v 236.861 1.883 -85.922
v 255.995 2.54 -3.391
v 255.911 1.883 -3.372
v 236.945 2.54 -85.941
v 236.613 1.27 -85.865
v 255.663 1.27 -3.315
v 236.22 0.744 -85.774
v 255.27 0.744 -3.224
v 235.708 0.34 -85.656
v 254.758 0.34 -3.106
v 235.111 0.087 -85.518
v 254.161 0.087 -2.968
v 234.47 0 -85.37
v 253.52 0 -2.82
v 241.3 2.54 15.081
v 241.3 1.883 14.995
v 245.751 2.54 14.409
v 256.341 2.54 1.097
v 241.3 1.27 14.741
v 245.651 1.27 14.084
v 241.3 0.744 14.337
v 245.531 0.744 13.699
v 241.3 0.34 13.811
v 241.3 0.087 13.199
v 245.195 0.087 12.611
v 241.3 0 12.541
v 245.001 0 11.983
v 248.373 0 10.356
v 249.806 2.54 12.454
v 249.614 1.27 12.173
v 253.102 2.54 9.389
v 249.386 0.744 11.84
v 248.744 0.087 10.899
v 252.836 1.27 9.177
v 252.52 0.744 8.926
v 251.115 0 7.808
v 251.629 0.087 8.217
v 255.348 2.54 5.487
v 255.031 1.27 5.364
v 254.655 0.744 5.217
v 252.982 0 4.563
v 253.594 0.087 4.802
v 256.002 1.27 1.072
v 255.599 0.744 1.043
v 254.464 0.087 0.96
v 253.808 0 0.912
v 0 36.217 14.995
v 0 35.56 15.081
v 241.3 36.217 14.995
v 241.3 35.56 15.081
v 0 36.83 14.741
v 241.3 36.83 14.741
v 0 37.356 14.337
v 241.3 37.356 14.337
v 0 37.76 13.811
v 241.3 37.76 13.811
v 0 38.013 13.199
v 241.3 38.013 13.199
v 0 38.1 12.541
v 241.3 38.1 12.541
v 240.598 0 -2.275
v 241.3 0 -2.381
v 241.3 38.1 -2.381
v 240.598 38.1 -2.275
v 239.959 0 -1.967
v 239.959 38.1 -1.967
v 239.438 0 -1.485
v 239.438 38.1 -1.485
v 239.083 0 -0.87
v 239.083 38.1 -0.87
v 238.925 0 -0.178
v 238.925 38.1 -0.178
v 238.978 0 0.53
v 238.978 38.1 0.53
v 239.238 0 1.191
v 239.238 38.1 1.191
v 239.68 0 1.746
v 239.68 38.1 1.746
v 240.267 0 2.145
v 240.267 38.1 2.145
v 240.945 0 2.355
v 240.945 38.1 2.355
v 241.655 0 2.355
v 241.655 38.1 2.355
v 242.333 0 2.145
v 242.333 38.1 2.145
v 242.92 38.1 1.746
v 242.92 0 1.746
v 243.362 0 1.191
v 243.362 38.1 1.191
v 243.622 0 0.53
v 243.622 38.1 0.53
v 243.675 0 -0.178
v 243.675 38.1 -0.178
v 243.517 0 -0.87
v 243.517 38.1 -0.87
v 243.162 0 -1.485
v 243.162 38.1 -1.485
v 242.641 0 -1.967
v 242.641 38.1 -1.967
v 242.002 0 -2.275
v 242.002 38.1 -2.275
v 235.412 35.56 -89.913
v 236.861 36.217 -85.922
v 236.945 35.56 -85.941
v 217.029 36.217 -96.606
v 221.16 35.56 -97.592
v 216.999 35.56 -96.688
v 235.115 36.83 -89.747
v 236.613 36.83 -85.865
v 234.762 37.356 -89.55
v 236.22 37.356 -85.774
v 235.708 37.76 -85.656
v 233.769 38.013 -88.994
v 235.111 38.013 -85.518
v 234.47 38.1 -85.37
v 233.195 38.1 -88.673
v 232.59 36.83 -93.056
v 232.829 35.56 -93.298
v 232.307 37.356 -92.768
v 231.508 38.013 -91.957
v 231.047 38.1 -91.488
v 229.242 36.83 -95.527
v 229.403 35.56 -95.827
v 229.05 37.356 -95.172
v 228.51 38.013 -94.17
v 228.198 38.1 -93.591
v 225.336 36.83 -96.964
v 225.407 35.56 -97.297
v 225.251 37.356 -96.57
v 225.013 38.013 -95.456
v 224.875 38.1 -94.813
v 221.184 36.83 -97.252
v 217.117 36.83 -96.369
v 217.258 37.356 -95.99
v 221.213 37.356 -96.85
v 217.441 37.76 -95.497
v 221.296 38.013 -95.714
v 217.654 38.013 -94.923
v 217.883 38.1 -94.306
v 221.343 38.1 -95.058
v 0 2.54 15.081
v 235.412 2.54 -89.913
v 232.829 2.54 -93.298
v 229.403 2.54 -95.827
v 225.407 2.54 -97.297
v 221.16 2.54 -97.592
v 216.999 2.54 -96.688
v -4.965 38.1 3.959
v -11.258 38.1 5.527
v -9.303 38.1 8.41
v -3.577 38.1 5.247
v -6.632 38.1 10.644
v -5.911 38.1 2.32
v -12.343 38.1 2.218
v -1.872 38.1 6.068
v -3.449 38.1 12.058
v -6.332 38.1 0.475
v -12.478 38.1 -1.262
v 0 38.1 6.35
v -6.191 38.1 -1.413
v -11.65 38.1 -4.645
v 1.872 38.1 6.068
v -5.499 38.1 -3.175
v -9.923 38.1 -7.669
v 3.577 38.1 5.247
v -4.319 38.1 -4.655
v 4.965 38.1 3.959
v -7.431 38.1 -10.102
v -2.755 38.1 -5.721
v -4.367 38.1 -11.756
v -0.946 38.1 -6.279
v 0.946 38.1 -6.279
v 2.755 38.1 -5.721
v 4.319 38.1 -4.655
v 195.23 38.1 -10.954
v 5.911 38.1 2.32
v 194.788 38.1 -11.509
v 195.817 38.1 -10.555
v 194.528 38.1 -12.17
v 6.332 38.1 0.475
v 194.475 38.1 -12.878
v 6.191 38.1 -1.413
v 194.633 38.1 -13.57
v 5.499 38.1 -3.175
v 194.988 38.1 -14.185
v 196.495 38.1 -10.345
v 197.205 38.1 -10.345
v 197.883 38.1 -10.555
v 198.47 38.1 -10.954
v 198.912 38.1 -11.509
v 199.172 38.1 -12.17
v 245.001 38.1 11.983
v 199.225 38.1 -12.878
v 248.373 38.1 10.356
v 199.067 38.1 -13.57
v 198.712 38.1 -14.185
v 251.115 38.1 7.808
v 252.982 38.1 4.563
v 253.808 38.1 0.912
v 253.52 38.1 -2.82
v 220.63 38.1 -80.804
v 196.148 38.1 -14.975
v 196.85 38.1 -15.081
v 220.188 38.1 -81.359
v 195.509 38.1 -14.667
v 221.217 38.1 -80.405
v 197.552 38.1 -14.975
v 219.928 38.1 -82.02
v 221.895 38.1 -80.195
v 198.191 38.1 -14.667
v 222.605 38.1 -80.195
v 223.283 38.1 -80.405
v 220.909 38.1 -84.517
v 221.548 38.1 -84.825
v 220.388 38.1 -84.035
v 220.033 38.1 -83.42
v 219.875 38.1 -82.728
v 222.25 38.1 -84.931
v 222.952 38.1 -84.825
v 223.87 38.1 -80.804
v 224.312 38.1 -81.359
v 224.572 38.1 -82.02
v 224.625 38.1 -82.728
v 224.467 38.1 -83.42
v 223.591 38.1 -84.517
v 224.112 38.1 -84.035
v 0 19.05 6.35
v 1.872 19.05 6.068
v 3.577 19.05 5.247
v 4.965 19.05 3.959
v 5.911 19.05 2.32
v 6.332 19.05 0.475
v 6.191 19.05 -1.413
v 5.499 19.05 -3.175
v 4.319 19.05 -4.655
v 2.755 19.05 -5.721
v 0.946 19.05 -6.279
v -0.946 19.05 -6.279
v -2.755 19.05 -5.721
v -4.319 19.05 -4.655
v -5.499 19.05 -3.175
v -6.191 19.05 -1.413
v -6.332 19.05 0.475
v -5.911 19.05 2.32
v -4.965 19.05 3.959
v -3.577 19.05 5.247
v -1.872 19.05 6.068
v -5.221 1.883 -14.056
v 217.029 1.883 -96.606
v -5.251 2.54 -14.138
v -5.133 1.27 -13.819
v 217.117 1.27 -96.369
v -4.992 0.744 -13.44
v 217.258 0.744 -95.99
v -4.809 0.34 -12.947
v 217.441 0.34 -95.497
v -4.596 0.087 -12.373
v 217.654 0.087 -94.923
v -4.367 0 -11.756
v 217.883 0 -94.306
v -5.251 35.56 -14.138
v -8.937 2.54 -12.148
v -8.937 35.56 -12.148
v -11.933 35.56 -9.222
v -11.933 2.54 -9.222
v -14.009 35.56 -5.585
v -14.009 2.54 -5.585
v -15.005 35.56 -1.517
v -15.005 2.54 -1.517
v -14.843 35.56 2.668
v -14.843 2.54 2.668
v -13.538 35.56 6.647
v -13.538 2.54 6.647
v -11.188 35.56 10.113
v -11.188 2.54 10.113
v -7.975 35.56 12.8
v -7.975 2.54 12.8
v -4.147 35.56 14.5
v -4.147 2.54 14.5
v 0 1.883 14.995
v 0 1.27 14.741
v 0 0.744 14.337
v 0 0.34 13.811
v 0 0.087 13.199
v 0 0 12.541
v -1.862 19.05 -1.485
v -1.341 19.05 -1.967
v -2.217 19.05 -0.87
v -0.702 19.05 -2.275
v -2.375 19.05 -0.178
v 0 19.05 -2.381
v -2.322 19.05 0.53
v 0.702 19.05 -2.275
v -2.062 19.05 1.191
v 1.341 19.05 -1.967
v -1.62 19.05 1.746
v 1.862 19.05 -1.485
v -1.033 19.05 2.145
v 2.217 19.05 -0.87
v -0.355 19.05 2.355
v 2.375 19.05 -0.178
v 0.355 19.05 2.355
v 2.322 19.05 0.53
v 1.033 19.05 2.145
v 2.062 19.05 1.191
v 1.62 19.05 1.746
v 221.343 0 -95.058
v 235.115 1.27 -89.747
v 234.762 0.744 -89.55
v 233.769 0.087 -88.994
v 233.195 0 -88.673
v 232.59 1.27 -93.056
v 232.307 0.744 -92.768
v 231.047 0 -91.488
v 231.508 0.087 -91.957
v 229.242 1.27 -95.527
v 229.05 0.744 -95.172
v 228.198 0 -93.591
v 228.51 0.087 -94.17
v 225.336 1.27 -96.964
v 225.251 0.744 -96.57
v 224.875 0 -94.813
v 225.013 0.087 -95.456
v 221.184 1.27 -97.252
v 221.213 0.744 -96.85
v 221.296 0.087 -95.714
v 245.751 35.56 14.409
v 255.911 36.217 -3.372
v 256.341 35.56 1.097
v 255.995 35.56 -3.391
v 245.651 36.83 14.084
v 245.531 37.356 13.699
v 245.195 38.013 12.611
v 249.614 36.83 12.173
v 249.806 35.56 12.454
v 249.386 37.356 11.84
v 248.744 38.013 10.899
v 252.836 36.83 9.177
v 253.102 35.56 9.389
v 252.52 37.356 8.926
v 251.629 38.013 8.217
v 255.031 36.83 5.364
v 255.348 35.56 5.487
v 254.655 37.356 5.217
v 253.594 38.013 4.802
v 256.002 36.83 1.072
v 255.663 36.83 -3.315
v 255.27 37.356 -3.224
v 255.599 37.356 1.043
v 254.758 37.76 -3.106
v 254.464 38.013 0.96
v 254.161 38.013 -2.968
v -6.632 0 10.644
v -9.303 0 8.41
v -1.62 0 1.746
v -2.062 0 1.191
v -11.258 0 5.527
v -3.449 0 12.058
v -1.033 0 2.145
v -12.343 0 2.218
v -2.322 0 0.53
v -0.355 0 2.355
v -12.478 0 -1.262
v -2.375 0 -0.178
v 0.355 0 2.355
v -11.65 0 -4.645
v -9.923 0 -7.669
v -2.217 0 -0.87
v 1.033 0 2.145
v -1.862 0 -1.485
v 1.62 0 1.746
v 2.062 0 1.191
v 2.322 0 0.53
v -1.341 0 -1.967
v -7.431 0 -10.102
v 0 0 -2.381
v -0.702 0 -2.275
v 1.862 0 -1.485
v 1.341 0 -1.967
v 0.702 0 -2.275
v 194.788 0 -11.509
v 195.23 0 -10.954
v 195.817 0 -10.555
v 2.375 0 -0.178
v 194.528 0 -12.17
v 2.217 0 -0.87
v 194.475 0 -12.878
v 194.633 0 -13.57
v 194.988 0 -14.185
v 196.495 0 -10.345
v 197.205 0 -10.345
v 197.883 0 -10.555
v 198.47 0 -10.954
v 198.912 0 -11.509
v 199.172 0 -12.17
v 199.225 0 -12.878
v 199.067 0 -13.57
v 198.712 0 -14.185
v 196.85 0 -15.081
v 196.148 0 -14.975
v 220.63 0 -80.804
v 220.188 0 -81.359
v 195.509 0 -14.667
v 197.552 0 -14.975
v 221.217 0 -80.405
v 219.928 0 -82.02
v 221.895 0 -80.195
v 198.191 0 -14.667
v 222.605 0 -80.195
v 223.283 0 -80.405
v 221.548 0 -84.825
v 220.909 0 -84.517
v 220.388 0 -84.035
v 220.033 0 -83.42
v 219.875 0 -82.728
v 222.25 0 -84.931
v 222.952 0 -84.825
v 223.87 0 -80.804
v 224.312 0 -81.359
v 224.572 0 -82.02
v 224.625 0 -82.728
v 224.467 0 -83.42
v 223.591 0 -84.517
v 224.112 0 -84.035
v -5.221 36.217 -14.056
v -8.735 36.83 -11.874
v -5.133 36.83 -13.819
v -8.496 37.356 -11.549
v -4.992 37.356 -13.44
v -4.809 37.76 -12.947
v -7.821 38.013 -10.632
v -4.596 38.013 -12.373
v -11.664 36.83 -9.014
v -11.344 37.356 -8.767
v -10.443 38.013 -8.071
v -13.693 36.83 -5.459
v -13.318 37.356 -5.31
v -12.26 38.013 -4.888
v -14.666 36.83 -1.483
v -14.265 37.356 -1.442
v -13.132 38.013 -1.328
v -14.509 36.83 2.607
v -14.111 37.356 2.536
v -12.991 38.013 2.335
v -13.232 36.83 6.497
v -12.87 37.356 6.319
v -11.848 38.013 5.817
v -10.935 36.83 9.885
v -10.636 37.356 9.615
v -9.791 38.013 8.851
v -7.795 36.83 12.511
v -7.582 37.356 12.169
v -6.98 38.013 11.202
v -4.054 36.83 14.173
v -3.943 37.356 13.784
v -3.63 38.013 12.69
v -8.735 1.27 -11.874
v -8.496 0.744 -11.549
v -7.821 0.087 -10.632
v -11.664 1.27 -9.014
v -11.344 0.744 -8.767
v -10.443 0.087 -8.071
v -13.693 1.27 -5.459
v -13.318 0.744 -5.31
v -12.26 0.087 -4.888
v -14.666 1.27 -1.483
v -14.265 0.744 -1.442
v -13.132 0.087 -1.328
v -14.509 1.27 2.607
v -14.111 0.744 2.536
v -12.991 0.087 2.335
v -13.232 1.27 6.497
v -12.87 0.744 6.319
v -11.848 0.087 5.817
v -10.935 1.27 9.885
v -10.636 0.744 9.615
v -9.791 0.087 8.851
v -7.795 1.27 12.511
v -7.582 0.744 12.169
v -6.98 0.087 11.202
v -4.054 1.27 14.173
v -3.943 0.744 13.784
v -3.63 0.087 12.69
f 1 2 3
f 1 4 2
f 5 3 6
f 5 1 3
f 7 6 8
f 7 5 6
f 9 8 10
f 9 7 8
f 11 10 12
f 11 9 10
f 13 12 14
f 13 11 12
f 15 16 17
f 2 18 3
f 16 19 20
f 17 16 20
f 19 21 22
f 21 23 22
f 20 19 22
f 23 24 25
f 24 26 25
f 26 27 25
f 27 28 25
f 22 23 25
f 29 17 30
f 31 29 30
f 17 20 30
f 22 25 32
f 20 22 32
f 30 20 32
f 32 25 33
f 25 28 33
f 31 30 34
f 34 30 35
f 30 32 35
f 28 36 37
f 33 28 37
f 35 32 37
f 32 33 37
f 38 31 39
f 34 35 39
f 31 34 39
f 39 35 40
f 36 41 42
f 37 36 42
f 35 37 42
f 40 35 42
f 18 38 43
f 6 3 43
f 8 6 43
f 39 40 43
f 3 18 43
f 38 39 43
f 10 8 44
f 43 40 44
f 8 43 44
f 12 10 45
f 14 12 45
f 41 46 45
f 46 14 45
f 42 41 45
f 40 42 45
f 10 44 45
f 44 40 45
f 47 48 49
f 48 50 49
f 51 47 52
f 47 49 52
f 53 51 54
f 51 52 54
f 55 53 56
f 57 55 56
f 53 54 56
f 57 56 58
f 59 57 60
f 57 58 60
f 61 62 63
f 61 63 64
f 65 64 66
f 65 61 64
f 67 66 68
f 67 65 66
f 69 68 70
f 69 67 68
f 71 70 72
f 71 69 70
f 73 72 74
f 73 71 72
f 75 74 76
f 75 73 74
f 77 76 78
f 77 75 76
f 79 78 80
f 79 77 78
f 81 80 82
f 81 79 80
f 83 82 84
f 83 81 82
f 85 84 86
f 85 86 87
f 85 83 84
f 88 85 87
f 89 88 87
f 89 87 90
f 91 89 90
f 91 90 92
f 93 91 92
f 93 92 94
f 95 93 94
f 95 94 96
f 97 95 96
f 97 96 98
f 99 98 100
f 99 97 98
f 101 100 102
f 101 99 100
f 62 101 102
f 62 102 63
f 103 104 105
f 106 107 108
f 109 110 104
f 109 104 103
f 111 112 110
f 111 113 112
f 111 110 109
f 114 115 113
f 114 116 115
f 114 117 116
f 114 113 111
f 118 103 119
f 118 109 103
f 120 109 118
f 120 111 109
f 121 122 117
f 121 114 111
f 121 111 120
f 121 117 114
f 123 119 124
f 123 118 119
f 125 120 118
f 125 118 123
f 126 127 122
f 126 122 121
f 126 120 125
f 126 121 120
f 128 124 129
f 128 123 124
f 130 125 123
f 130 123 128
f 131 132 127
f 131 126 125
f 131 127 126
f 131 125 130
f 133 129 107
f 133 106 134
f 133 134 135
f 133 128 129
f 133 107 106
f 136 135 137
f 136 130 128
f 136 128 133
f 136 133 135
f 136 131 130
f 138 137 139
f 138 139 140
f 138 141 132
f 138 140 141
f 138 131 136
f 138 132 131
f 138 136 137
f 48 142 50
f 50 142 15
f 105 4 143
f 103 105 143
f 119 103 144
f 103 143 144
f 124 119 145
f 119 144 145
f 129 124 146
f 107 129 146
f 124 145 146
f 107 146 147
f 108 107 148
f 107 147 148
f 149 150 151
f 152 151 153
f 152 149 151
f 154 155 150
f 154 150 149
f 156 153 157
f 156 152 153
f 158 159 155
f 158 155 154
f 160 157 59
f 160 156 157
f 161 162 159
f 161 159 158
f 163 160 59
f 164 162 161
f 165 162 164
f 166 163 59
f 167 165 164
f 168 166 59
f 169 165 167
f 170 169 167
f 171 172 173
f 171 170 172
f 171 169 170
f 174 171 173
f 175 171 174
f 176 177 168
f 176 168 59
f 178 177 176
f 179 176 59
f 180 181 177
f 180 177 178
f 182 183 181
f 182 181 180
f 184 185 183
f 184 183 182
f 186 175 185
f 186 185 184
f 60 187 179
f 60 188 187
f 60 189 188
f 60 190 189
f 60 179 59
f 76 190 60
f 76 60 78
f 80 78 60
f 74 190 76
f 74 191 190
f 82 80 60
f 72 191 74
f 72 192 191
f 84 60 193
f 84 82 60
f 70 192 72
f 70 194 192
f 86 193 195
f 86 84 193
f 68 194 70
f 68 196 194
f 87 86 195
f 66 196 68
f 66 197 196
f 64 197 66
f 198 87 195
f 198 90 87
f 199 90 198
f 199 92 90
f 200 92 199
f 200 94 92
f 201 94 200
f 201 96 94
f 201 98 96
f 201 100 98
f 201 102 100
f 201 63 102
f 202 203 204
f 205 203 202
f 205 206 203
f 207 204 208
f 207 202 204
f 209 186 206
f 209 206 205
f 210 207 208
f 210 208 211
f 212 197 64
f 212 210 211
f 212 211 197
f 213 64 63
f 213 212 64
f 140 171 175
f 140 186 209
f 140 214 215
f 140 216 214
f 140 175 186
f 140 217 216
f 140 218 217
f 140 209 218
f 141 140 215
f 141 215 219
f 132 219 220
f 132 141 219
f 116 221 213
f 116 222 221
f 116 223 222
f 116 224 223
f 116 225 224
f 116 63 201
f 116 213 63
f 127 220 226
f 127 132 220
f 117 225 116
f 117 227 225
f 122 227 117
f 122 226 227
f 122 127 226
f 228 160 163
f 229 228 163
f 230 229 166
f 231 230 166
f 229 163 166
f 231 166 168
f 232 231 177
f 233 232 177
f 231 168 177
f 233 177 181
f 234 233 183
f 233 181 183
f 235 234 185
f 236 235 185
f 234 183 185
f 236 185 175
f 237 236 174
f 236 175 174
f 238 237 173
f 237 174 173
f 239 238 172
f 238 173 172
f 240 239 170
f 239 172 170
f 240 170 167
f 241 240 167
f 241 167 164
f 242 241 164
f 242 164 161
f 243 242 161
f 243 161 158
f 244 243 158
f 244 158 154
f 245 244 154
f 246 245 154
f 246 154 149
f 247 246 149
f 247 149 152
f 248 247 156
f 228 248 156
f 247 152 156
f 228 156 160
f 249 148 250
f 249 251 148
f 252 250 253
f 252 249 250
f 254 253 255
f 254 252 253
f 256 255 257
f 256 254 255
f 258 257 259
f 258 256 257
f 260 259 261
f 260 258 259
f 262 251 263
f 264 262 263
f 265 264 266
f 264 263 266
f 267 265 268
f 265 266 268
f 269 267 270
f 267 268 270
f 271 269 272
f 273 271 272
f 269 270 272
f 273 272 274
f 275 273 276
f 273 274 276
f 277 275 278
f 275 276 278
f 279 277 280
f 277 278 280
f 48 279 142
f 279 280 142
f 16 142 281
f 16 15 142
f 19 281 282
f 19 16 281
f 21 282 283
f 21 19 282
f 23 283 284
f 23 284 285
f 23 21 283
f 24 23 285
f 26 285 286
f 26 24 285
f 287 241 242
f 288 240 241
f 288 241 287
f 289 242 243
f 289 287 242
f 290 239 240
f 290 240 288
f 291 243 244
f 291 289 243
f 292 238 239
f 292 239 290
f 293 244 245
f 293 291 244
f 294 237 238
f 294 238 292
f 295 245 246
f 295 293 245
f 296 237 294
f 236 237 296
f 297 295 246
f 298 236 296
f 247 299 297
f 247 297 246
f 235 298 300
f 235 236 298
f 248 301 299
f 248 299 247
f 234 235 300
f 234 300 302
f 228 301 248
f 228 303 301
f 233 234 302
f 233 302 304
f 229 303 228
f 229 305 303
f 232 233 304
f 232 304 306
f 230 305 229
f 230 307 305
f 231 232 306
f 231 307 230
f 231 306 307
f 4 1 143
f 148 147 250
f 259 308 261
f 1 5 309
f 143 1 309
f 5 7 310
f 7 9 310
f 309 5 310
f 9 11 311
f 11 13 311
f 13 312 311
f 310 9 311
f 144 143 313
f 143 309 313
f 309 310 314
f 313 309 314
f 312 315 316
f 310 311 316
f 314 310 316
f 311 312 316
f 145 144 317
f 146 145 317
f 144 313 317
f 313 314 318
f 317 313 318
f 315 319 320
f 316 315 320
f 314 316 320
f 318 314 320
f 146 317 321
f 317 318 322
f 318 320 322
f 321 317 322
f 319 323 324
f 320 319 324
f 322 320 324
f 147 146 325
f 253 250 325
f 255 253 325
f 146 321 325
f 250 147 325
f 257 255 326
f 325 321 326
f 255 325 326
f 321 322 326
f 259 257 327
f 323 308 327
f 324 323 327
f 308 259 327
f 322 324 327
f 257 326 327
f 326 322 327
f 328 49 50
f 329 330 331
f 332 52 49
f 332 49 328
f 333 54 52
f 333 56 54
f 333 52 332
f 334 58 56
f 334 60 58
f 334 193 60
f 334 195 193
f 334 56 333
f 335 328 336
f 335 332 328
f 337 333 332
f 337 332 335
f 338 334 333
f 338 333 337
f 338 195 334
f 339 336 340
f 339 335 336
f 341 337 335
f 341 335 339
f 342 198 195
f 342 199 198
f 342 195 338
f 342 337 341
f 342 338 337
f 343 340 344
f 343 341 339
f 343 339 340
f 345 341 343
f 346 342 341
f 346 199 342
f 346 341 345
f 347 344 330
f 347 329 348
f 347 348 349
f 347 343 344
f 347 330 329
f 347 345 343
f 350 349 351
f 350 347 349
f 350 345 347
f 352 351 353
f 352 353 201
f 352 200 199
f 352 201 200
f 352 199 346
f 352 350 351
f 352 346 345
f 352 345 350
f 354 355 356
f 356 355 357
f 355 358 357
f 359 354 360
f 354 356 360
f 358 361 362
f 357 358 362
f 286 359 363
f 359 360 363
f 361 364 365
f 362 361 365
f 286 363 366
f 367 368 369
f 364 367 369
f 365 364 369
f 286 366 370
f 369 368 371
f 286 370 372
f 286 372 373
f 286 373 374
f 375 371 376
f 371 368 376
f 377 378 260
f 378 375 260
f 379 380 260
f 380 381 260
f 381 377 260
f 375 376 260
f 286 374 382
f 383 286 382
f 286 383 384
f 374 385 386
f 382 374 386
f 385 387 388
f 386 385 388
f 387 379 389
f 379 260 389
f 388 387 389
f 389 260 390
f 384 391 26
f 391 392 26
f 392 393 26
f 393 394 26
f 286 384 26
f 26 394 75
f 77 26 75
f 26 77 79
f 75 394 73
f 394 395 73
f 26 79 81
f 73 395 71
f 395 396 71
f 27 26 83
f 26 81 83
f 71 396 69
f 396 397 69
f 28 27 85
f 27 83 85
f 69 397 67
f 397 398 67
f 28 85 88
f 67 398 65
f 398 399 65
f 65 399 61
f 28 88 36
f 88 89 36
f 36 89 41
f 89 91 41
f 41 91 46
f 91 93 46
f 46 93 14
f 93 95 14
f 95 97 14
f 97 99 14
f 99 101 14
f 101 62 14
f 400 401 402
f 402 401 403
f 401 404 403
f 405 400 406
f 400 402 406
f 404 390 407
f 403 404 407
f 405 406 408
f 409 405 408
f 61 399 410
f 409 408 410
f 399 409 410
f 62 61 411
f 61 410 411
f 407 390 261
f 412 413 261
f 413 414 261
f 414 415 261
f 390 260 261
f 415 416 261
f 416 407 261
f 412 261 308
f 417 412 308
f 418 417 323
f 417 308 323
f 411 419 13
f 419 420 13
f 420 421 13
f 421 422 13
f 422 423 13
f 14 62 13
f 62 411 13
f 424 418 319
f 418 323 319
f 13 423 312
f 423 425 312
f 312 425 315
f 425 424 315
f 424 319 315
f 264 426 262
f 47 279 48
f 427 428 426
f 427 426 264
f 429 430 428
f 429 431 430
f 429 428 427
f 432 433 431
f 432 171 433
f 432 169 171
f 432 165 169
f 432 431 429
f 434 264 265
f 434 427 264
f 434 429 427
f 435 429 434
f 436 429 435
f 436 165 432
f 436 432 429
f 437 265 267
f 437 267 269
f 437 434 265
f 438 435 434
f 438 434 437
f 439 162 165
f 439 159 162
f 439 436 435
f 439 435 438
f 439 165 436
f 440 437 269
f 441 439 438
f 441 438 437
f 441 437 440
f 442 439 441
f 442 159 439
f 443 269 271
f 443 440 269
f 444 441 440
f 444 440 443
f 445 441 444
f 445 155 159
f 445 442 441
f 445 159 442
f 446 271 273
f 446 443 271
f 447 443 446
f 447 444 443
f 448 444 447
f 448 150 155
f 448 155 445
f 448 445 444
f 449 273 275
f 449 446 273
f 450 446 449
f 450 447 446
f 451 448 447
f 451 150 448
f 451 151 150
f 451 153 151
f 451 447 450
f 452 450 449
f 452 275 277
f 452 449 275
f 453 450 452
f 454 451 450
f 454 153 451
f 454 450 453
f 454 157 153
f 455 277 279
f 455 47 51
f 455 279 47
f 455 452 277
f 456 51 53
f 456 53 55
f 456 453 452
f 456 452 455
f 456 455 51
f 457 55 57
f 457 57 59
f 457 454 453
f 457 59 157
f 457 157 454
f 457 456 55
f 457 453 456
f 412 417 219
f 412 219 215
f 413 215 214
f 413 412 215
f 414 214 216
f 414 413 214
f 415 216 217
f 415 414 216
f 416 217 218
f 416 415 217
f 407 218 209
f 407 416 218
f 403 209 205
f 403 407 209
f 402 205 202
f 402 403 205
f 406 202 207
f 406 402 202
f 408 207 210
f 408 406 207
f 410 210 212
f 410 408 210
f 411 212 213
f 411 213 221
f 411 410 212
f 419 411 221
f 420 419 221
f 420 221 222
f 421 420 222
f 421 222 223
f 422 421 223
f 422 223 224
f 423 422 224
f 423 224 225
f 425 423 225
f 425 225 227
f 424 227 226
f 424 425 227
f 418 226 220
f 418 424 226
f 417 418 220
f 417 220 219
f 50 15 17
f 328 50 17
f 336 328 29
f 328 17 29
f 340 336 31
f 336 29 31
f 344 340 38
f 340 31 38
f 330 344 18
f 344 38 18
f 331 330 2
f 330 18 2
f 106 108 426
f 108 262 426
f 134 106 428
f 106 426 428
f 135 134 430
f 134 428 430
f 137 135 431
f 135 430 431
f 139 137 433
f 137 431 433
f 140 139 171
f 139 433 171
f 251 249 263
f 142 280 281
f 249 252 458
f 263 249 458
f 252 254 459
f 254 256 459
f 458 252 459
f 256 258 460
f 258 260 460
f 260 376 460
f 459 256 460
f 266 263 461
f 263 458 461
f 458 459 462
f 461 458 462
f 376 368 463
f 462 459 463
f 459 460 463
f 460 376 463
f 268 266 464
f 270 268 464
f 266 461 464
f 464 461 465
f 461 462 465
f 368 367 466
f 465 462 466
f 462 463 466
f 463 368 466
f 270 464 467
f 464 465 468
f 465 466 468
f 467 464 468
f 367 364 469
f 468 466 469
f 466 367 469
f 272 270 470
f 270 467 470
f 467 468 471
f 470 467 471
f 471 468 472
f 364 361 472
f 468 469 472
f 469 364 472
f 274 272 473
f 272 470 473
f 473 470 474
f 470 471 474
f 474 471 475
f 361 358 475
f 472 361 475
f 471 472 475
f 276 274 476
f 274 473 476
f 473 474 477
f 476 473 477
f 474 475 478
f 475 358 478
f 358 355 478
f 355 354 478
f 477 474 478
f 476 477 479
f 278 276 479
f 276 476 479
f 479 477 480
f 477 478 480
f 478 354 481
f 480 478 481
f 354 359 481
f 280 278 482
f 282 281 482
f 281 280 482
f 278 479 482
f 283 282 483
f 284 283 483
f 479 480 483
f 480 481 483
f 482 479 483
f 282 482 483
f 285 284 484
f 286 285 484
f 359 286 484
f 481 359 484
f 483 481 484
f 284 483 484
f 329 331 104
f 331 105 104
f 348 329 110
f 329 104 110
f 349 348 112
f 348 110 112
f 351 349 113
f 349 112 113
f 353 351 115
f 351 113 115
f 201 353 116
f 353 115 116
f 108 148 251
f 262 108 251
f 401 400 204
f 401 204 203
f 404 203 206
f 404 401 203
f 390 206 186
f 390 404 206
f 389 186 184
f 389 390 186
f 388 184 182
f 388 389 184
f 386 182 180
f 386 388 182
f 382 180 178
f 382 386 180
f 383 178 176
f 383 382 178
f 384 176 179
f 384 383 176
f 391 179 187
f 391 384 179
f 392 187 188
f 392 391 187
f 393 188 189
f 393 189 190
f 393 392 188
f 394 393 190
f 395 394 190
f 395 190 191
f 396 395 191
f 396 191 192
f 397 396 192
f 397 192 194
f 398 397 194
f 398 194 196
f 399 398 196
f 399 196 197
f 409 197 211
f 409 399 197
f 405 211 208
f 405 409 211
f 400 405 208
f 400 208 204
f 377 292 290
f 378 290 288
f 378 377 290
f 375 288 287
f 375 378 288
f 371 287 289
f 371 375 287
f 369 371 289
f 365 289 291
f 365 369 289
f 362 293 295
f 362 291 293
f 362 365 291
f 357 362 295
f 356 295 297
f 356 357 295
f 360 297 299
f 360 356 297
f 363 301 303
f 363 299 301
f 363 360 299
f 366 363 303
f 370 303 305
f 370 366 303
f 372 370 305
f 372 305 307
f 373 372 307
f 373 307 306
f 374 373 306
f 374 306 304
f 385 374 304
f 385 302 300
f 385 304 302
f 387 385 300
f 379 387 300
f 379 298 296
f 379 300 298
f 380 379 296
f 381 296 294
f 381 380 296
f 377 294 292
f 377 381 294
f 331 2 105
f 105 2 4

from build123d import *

# Parameters (mm, degrees)
SKETCH1_R           = 2.38125
BOSS_EXTRUDE1_DEPTH = 38.1
FILLET1_R           = 2.54
SKETCH2_R           = 6.35
CUT_EXTRUDE1_DEPTH  = 19.05


with BuildPart() as part:
    # Sketch1 → Boss-Extrude1 (new body)
    with BuildSketch(Plane(origin=(0, 0, 0), x_dir=(1, 0, 0), z_dir=(0, 1, 0))):
        with BuildLine():
            Line((216.9989119, 96.687544883), (-5.2510881, 14.137544883))
            ThreePointArc((-5.2510881, 14.137544883), (-14.843448897, -2.667606866), (0, -15.08125))
            Line((0, -15.08125), (241.3, -15.08125))
            ThreePointArc((241.3, -15.08125), (253.102268215, -9.388853313), (255.99503722, 3.391162435))
            Line((255.99503722, 3.391162435), (236.94503722, 85.941162435))
            ThreePointArc((236.94503722, 85.941162435), (229.403197025, 95.826892478), (216.9989119, 96.687544883))
        make_face()
        with Locations(Location((0, 0, 0), (0, 0, 90))):
            Circle(SKETCH1_R, mode=Mode.SUBTRACT)
        with Locations(Location((196.85, 12.7, 0), (0, 0, 90))):
            Circle(SKETCH1_R, mode=Mode.SUBTRACT)
        with Locations(Location((241.3, 0, 0), (0, 0, 90))):
            Circle(SKETCH1_R, mode=Mode.SUBTRACT)
        with Locations(Location((222.25, 82.55, 0), (0, 0, 90))):
            Circle(SKETCH1_R, mode=Mode.SUBTRACT)
    extrude(amount=BOSS_EXTRUDE1_DEPTH)

    # Fillet1
    fillet1_edges = [part.edges().sort_by_distance(p)[0] for p in [
        (229.403197025, 38.1, -95.826892478),
        (253.102268215, 0, 9.388853313),
        (120.65, 0, 15.08125),
        (-14.843448897, 0, 2.667606866),
        (105.8739119, 0, -55.412544883),
        (229.403197025, 0, -95.826892478),
        (246.47003722, 0, -44.666162435),
        (105.8739119, 38.1, -55.412544883),
        (-14.843448897, 38.1, 2.667606866),
        (120.65, 38.1, 15.08125),
        (253.102268215, 38.1, 9.388853313),
        (246.47003722, 38.1, -44.666162435),
    ]]
    fillet(fillet1_edges, radius=FILLET1_R)

    # Sketch2 → Cut-Extrude1 (cut)
    with BuildSketch(Plane(origin=(0, 38.1, 0), x_dir=(1, 0, 0), z_dir=(0, 1, 0))):
        with Locations(Location((0, 0, 0), (0, 0, 270))):
            Circle(SKETCH2_R)
    extrude(amount=-CUT_EXTRUDE1_DEPTH, mode=Mode.SUBTRACT)


solid = part.part
